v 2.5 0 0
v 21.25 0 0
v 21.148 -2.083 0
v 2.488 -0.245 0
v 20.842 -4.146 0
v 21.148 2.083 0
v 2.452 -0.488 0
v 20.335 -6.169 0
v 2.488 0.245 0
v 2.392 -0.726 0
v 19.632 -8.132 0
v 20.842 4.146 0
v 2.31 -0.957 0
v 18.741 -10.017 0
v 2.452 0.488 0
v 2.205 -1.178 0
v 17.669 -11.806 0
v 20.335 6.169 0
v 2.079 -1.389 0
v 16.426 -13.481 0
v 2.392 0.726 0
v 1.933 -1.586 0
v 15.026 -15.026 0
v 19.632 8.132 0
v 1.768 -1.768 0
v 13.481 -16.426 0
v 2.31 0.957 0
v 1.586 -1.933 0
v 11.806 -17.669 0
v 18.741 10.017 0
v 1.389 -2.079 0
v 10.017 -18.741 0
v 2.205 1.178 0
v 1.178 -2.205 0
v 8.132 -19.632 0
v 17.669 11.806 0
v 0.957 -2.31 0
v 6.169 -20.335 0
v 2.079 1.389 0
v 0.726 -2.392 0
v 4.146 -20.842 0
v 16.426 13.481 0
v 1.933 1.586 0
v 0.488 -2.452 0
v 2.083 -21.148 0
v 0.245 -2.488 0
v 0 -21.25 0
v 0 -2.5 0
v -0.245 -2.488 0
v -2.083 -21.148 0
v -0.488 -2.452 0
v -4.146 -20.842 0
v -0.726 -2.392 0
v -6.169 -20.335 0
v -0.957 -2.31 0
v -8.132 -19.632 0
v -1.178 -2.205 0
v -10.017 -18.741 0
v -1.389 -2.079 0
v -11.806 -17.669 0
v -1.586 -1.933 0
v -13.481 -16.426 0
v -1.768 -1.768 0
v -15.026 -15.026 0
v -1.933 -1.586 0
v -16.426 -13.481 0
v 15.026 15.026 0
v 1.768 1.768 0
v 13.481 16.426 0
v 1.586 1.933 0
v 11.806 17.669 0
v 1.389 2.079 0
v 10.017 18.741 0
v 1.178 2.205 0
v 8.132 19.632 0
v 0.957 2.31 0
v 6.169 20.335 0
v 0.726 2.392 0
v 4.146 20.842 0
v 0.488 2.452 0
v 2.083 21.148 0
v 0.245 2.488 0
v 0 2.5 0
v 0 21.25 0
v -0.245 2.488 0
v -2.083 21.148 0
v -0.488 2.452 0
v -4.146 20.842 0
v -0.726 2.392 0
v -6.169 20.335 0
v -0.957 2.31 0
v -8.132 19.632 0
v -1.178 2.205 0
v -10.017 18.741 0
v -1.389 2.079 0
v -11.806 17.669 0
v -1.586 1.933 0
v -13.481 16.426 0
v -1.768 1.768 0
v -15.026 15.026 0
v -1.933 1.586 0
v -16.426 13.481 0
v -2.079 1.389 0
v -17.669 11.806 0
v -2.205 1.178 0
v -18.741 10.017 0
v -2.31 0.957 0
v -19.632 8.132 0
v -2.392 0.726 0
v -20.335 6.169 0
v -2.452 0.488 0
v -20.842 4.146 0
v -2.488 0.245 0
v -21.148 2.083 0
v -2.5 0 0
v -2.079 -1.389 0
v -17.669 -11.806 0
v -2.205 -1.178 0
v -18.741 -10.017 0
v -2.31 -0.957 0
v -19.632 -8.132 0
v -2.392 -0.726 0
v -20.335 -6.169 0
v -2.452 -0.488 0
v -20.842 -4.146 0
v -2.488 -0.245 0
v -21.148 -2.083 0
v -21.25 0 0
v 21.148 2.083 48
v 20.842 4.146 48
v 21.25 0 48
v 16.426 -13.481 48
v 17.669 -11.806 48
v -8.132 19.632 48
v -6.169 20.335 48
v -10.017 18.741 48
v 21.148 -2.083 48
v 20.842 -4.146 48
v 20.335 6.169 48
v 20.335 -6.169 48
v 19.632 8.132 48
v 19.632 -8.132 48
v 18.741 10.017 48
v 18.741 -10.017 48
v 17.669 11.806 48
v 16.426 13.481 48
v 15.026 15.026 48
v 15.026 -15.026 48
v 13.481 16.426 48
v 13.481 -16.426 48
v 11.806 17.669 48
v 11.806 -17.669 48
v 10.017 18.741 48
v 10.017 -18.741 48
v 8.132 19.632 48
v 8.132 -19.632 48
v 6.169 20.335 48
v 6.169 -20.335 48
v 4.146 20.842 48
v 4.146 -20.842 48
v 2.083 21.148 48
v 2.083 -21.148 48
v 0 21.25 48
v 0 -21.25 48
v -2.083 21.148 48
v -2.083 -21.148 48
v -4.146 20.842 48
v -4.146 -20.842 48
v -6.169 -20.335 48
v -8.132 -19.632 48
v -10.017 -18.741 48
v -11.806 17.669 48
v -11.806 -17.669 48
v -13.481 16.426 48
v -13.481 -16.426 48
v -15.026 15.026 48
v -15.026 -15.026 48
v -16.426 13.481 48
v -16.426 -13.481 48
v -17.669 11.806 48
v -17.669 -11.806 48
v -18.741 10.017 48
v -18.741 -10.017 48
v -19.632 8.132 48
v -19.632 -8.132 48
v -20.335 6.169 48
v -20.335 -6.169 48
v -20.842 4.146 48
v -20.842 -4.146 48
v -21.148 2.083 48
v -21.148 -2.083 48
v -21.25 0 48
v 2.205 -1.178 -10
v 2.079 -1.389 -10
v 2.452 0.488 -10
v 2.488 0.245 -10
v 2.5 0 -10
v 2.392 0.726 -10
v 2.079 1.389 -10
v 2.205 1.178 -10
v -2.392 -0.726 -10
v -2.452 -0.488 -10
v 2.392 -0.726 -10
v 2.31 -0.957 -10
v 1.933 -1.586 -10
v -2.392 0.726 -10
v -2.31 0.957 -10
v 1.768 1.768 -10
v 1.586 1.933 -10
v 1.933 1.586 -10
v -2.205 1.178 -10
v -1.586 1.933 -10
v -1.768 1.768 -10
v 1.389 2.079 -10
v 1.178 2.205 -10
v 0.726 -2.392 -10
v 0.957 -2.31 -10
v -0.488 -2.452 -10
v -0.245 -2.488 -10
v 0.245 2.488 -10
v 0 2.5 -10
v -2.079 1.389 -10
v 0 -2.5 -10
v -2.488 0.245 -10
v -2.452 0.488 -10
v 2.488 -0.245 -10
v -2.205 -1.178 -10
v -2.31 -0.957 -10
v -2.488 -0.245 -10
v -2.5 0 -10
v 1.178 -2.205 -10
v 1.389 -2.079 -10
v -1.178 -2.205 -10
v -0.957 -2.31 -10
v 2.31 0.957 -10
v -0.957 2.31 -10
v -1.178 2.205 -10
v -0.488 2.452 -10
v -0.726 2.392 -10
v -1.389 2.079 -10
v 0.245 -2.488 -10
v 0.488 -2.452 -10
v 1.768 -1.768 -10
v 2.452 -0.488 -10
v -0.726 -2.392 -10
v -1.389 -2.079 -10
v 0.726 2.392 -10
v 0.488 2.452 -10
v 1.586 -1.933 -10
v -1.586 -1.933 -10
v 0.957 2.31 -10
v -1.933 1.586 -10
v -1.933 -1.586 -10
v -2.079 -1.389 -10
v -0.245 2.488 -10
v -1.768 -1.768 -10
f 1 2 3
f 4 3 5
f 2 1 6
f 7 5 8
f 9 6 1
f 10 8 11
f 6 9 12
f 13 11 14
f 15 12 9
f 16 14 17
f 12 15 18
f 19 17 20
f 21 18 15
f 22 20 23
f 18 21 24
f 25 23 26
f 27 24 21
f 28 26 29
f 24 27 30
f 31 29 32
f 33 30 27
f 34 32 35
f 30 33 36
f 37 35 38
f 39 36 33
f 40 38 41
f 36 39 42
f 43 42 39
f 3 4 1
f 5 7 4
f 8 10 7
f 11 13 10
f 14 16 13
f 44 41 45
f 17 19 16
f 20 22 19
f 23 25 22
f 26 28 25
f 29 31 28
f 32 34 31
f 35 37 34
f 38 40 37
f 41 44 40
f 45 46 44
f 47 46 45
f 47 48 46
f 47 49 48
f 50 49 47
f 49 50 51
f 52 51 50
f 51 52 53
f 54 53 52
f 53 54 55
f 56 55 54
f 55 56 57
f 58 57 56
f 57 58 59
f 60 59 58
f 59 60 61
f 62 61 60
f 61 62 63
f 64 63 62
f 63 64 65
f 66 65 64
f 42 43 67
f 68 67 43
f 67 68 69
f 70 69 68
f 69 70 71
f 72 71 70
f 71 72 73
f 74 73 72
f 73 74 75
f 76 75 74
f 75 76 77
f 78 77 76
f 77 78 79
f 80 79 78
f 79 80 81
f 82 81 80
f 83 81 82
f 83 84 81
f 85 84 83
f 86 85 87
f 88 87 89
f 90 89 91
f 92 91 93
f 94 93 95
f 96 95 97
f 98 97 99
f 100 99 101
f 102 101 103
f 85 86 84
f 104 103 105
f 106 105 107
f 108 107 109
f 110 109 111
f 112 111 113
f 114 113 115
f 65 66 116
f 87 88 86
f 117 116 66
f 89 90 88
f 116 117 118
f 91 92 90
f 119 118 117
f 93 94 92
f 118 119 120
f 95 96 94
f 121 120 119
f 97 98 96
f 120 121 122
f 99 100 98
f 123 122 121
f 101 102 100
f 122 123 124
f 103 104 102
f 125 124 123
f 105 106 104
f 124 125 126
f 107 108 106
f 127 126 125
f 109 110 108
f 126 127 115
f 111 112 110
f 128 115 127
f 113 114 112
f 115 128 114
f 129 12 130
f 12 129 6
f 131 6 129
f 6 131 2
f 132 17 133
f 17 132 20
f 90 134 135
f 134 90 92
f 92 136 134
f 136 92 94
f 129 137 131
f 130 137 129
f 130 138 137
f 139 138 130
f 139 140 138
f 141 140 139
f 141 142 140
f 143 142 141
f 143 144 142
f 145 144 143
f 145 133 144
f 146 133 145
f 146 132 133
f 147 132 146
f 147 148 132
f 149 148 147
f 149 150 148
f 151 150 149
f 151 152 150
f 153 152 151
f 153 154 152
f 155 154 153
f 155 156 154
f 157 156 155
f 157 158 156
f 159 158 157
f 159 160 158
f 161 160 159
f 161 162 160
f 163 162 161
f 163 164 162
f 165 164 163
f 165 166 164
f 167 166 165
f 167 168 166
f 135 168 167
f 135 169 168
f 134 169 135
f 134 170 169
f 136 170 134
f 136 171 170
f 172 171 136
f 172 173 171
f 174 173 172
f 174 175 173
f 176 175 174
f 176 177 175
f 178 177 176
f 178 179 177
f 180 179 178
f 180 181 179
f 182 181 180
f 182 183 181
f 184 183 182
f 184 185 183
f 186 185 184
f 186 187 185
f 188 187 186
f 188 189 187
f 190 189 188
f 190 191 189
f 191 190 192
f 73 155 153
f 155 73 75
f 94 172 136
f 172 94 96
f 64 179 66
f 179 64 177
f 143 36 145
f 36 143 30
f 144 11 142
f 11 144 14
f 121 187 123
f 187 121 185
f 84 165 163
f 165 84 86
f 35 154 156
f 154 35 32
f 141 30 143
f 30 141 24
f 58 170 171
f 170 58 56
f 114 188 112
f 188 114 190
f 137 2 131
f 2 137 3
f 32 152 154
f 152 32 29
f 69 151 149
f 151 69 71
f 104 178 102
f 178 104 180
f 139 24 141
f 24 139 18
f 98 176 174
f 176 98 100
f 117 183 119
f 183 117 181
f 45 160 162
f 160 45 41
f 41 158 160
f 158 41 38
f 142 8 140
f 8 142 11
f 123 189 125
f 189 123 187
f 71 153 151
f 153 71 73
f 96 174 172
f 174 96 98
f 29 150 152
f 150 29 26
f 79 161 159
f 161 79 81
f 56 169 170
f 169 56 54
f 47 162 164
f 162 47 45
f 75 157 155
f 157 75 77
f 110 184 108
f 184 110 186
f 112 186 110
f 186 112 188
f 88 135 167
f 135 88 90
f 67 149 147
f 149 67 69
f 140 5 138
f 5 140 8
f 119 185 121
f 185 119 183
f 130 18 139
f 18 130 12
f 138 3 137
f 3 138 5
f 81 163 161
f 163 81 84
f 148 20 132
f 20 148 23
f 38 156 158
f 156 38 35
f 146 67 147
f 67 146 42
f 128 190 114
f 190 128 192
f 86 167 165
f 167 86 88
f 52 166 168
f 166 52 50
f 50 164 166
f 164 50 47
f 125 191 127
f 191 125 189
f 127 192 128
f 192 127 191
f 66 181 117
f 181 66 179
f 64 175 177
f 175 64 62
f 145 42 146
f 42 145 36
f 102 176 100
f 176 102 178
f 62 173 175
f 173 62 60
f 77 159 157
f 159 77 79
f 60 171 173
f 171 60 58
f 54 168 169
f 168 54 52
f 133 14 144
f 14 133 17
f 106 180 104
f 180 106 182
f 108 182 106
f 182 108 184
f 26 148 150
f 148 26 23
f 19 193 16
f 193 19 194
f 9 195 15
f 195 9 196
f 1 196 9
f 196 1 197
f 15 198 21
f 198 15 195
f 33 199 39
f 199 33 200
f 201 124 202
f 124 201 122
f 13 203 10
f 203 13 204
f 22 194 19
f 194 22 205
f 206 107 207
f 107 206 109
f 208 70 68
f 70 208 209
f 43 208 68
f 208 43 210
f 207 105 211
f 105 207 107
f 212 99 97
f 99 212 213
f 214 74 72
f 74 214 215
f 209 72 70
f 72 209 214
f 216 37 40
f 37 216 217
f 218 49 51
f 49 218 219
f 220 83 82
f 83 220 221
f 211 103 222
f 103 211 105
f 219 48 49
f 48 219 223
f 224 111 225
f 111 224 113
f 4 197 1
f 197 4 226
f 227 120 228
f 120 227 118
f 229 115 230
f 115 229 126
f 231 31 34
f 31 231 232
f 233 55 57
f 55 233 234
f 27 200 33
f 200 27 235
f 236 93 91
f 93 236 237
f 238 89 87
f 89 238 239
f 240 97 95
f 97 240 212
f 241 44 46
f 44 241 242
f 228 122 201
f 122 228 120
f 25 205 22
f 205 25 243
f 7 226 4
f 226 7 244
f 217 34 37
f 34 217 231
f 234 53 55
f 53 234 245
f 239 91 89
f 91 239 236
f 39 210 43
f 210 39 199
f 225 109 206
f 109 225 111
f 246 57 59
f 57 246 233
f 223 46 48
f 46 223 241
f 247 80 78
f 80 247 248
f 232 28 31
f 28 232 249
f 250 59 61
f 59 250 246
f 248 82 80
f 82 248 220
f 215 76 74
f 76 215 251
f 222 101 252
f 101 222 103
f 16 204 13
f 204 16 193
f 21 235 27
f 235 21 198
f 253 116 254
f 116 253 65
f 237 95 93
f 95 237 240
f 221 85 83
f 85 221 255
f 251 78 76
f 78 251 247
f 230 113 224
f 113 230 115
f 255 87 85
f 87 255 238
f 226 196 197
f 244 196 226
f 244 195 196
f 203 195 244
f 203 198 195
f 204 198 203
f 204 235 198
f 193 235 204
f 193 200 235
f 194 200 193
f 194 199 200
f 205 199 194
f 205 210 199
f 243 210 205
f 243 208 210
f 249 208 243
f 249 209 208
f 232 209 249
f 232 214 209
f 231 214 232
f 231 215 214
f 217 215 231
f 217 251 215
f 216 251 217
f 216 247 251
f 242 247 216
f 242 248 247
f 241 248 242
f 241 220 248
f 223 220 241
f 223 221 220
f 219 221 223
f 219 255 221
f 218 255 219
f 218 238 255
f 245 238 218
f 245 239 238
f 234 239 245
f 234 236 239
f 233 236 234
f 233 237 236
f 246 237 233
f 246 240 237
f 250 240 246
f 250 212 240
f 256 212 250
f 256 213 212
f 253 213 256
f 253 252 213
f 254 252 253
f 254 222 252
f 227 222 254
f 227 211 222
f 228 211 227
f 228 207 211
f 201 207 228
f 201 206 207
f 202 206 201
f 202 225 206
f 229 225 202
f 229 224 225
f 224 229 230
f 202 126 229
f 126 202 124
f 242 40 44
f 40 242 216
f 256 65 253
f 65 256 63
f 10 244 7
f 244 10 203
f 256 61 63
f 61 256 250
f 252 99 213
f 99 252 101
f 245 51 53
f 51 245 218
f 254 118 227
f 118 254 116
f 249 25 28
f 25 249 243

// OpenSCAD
module brushless_dc_motor() {
    // Stator
    cylinder(d=42.5, h=48.0, $fn=64);
    
    // Rotor
    translate([0, 0, 5])
        cylinder(d=40, h=38, $fn=64);
    
    // Shaft
    translate([0, 0, -10])
        cylinder(d=5, h=58, $fn=64);
}

brushless_dc_motor();
